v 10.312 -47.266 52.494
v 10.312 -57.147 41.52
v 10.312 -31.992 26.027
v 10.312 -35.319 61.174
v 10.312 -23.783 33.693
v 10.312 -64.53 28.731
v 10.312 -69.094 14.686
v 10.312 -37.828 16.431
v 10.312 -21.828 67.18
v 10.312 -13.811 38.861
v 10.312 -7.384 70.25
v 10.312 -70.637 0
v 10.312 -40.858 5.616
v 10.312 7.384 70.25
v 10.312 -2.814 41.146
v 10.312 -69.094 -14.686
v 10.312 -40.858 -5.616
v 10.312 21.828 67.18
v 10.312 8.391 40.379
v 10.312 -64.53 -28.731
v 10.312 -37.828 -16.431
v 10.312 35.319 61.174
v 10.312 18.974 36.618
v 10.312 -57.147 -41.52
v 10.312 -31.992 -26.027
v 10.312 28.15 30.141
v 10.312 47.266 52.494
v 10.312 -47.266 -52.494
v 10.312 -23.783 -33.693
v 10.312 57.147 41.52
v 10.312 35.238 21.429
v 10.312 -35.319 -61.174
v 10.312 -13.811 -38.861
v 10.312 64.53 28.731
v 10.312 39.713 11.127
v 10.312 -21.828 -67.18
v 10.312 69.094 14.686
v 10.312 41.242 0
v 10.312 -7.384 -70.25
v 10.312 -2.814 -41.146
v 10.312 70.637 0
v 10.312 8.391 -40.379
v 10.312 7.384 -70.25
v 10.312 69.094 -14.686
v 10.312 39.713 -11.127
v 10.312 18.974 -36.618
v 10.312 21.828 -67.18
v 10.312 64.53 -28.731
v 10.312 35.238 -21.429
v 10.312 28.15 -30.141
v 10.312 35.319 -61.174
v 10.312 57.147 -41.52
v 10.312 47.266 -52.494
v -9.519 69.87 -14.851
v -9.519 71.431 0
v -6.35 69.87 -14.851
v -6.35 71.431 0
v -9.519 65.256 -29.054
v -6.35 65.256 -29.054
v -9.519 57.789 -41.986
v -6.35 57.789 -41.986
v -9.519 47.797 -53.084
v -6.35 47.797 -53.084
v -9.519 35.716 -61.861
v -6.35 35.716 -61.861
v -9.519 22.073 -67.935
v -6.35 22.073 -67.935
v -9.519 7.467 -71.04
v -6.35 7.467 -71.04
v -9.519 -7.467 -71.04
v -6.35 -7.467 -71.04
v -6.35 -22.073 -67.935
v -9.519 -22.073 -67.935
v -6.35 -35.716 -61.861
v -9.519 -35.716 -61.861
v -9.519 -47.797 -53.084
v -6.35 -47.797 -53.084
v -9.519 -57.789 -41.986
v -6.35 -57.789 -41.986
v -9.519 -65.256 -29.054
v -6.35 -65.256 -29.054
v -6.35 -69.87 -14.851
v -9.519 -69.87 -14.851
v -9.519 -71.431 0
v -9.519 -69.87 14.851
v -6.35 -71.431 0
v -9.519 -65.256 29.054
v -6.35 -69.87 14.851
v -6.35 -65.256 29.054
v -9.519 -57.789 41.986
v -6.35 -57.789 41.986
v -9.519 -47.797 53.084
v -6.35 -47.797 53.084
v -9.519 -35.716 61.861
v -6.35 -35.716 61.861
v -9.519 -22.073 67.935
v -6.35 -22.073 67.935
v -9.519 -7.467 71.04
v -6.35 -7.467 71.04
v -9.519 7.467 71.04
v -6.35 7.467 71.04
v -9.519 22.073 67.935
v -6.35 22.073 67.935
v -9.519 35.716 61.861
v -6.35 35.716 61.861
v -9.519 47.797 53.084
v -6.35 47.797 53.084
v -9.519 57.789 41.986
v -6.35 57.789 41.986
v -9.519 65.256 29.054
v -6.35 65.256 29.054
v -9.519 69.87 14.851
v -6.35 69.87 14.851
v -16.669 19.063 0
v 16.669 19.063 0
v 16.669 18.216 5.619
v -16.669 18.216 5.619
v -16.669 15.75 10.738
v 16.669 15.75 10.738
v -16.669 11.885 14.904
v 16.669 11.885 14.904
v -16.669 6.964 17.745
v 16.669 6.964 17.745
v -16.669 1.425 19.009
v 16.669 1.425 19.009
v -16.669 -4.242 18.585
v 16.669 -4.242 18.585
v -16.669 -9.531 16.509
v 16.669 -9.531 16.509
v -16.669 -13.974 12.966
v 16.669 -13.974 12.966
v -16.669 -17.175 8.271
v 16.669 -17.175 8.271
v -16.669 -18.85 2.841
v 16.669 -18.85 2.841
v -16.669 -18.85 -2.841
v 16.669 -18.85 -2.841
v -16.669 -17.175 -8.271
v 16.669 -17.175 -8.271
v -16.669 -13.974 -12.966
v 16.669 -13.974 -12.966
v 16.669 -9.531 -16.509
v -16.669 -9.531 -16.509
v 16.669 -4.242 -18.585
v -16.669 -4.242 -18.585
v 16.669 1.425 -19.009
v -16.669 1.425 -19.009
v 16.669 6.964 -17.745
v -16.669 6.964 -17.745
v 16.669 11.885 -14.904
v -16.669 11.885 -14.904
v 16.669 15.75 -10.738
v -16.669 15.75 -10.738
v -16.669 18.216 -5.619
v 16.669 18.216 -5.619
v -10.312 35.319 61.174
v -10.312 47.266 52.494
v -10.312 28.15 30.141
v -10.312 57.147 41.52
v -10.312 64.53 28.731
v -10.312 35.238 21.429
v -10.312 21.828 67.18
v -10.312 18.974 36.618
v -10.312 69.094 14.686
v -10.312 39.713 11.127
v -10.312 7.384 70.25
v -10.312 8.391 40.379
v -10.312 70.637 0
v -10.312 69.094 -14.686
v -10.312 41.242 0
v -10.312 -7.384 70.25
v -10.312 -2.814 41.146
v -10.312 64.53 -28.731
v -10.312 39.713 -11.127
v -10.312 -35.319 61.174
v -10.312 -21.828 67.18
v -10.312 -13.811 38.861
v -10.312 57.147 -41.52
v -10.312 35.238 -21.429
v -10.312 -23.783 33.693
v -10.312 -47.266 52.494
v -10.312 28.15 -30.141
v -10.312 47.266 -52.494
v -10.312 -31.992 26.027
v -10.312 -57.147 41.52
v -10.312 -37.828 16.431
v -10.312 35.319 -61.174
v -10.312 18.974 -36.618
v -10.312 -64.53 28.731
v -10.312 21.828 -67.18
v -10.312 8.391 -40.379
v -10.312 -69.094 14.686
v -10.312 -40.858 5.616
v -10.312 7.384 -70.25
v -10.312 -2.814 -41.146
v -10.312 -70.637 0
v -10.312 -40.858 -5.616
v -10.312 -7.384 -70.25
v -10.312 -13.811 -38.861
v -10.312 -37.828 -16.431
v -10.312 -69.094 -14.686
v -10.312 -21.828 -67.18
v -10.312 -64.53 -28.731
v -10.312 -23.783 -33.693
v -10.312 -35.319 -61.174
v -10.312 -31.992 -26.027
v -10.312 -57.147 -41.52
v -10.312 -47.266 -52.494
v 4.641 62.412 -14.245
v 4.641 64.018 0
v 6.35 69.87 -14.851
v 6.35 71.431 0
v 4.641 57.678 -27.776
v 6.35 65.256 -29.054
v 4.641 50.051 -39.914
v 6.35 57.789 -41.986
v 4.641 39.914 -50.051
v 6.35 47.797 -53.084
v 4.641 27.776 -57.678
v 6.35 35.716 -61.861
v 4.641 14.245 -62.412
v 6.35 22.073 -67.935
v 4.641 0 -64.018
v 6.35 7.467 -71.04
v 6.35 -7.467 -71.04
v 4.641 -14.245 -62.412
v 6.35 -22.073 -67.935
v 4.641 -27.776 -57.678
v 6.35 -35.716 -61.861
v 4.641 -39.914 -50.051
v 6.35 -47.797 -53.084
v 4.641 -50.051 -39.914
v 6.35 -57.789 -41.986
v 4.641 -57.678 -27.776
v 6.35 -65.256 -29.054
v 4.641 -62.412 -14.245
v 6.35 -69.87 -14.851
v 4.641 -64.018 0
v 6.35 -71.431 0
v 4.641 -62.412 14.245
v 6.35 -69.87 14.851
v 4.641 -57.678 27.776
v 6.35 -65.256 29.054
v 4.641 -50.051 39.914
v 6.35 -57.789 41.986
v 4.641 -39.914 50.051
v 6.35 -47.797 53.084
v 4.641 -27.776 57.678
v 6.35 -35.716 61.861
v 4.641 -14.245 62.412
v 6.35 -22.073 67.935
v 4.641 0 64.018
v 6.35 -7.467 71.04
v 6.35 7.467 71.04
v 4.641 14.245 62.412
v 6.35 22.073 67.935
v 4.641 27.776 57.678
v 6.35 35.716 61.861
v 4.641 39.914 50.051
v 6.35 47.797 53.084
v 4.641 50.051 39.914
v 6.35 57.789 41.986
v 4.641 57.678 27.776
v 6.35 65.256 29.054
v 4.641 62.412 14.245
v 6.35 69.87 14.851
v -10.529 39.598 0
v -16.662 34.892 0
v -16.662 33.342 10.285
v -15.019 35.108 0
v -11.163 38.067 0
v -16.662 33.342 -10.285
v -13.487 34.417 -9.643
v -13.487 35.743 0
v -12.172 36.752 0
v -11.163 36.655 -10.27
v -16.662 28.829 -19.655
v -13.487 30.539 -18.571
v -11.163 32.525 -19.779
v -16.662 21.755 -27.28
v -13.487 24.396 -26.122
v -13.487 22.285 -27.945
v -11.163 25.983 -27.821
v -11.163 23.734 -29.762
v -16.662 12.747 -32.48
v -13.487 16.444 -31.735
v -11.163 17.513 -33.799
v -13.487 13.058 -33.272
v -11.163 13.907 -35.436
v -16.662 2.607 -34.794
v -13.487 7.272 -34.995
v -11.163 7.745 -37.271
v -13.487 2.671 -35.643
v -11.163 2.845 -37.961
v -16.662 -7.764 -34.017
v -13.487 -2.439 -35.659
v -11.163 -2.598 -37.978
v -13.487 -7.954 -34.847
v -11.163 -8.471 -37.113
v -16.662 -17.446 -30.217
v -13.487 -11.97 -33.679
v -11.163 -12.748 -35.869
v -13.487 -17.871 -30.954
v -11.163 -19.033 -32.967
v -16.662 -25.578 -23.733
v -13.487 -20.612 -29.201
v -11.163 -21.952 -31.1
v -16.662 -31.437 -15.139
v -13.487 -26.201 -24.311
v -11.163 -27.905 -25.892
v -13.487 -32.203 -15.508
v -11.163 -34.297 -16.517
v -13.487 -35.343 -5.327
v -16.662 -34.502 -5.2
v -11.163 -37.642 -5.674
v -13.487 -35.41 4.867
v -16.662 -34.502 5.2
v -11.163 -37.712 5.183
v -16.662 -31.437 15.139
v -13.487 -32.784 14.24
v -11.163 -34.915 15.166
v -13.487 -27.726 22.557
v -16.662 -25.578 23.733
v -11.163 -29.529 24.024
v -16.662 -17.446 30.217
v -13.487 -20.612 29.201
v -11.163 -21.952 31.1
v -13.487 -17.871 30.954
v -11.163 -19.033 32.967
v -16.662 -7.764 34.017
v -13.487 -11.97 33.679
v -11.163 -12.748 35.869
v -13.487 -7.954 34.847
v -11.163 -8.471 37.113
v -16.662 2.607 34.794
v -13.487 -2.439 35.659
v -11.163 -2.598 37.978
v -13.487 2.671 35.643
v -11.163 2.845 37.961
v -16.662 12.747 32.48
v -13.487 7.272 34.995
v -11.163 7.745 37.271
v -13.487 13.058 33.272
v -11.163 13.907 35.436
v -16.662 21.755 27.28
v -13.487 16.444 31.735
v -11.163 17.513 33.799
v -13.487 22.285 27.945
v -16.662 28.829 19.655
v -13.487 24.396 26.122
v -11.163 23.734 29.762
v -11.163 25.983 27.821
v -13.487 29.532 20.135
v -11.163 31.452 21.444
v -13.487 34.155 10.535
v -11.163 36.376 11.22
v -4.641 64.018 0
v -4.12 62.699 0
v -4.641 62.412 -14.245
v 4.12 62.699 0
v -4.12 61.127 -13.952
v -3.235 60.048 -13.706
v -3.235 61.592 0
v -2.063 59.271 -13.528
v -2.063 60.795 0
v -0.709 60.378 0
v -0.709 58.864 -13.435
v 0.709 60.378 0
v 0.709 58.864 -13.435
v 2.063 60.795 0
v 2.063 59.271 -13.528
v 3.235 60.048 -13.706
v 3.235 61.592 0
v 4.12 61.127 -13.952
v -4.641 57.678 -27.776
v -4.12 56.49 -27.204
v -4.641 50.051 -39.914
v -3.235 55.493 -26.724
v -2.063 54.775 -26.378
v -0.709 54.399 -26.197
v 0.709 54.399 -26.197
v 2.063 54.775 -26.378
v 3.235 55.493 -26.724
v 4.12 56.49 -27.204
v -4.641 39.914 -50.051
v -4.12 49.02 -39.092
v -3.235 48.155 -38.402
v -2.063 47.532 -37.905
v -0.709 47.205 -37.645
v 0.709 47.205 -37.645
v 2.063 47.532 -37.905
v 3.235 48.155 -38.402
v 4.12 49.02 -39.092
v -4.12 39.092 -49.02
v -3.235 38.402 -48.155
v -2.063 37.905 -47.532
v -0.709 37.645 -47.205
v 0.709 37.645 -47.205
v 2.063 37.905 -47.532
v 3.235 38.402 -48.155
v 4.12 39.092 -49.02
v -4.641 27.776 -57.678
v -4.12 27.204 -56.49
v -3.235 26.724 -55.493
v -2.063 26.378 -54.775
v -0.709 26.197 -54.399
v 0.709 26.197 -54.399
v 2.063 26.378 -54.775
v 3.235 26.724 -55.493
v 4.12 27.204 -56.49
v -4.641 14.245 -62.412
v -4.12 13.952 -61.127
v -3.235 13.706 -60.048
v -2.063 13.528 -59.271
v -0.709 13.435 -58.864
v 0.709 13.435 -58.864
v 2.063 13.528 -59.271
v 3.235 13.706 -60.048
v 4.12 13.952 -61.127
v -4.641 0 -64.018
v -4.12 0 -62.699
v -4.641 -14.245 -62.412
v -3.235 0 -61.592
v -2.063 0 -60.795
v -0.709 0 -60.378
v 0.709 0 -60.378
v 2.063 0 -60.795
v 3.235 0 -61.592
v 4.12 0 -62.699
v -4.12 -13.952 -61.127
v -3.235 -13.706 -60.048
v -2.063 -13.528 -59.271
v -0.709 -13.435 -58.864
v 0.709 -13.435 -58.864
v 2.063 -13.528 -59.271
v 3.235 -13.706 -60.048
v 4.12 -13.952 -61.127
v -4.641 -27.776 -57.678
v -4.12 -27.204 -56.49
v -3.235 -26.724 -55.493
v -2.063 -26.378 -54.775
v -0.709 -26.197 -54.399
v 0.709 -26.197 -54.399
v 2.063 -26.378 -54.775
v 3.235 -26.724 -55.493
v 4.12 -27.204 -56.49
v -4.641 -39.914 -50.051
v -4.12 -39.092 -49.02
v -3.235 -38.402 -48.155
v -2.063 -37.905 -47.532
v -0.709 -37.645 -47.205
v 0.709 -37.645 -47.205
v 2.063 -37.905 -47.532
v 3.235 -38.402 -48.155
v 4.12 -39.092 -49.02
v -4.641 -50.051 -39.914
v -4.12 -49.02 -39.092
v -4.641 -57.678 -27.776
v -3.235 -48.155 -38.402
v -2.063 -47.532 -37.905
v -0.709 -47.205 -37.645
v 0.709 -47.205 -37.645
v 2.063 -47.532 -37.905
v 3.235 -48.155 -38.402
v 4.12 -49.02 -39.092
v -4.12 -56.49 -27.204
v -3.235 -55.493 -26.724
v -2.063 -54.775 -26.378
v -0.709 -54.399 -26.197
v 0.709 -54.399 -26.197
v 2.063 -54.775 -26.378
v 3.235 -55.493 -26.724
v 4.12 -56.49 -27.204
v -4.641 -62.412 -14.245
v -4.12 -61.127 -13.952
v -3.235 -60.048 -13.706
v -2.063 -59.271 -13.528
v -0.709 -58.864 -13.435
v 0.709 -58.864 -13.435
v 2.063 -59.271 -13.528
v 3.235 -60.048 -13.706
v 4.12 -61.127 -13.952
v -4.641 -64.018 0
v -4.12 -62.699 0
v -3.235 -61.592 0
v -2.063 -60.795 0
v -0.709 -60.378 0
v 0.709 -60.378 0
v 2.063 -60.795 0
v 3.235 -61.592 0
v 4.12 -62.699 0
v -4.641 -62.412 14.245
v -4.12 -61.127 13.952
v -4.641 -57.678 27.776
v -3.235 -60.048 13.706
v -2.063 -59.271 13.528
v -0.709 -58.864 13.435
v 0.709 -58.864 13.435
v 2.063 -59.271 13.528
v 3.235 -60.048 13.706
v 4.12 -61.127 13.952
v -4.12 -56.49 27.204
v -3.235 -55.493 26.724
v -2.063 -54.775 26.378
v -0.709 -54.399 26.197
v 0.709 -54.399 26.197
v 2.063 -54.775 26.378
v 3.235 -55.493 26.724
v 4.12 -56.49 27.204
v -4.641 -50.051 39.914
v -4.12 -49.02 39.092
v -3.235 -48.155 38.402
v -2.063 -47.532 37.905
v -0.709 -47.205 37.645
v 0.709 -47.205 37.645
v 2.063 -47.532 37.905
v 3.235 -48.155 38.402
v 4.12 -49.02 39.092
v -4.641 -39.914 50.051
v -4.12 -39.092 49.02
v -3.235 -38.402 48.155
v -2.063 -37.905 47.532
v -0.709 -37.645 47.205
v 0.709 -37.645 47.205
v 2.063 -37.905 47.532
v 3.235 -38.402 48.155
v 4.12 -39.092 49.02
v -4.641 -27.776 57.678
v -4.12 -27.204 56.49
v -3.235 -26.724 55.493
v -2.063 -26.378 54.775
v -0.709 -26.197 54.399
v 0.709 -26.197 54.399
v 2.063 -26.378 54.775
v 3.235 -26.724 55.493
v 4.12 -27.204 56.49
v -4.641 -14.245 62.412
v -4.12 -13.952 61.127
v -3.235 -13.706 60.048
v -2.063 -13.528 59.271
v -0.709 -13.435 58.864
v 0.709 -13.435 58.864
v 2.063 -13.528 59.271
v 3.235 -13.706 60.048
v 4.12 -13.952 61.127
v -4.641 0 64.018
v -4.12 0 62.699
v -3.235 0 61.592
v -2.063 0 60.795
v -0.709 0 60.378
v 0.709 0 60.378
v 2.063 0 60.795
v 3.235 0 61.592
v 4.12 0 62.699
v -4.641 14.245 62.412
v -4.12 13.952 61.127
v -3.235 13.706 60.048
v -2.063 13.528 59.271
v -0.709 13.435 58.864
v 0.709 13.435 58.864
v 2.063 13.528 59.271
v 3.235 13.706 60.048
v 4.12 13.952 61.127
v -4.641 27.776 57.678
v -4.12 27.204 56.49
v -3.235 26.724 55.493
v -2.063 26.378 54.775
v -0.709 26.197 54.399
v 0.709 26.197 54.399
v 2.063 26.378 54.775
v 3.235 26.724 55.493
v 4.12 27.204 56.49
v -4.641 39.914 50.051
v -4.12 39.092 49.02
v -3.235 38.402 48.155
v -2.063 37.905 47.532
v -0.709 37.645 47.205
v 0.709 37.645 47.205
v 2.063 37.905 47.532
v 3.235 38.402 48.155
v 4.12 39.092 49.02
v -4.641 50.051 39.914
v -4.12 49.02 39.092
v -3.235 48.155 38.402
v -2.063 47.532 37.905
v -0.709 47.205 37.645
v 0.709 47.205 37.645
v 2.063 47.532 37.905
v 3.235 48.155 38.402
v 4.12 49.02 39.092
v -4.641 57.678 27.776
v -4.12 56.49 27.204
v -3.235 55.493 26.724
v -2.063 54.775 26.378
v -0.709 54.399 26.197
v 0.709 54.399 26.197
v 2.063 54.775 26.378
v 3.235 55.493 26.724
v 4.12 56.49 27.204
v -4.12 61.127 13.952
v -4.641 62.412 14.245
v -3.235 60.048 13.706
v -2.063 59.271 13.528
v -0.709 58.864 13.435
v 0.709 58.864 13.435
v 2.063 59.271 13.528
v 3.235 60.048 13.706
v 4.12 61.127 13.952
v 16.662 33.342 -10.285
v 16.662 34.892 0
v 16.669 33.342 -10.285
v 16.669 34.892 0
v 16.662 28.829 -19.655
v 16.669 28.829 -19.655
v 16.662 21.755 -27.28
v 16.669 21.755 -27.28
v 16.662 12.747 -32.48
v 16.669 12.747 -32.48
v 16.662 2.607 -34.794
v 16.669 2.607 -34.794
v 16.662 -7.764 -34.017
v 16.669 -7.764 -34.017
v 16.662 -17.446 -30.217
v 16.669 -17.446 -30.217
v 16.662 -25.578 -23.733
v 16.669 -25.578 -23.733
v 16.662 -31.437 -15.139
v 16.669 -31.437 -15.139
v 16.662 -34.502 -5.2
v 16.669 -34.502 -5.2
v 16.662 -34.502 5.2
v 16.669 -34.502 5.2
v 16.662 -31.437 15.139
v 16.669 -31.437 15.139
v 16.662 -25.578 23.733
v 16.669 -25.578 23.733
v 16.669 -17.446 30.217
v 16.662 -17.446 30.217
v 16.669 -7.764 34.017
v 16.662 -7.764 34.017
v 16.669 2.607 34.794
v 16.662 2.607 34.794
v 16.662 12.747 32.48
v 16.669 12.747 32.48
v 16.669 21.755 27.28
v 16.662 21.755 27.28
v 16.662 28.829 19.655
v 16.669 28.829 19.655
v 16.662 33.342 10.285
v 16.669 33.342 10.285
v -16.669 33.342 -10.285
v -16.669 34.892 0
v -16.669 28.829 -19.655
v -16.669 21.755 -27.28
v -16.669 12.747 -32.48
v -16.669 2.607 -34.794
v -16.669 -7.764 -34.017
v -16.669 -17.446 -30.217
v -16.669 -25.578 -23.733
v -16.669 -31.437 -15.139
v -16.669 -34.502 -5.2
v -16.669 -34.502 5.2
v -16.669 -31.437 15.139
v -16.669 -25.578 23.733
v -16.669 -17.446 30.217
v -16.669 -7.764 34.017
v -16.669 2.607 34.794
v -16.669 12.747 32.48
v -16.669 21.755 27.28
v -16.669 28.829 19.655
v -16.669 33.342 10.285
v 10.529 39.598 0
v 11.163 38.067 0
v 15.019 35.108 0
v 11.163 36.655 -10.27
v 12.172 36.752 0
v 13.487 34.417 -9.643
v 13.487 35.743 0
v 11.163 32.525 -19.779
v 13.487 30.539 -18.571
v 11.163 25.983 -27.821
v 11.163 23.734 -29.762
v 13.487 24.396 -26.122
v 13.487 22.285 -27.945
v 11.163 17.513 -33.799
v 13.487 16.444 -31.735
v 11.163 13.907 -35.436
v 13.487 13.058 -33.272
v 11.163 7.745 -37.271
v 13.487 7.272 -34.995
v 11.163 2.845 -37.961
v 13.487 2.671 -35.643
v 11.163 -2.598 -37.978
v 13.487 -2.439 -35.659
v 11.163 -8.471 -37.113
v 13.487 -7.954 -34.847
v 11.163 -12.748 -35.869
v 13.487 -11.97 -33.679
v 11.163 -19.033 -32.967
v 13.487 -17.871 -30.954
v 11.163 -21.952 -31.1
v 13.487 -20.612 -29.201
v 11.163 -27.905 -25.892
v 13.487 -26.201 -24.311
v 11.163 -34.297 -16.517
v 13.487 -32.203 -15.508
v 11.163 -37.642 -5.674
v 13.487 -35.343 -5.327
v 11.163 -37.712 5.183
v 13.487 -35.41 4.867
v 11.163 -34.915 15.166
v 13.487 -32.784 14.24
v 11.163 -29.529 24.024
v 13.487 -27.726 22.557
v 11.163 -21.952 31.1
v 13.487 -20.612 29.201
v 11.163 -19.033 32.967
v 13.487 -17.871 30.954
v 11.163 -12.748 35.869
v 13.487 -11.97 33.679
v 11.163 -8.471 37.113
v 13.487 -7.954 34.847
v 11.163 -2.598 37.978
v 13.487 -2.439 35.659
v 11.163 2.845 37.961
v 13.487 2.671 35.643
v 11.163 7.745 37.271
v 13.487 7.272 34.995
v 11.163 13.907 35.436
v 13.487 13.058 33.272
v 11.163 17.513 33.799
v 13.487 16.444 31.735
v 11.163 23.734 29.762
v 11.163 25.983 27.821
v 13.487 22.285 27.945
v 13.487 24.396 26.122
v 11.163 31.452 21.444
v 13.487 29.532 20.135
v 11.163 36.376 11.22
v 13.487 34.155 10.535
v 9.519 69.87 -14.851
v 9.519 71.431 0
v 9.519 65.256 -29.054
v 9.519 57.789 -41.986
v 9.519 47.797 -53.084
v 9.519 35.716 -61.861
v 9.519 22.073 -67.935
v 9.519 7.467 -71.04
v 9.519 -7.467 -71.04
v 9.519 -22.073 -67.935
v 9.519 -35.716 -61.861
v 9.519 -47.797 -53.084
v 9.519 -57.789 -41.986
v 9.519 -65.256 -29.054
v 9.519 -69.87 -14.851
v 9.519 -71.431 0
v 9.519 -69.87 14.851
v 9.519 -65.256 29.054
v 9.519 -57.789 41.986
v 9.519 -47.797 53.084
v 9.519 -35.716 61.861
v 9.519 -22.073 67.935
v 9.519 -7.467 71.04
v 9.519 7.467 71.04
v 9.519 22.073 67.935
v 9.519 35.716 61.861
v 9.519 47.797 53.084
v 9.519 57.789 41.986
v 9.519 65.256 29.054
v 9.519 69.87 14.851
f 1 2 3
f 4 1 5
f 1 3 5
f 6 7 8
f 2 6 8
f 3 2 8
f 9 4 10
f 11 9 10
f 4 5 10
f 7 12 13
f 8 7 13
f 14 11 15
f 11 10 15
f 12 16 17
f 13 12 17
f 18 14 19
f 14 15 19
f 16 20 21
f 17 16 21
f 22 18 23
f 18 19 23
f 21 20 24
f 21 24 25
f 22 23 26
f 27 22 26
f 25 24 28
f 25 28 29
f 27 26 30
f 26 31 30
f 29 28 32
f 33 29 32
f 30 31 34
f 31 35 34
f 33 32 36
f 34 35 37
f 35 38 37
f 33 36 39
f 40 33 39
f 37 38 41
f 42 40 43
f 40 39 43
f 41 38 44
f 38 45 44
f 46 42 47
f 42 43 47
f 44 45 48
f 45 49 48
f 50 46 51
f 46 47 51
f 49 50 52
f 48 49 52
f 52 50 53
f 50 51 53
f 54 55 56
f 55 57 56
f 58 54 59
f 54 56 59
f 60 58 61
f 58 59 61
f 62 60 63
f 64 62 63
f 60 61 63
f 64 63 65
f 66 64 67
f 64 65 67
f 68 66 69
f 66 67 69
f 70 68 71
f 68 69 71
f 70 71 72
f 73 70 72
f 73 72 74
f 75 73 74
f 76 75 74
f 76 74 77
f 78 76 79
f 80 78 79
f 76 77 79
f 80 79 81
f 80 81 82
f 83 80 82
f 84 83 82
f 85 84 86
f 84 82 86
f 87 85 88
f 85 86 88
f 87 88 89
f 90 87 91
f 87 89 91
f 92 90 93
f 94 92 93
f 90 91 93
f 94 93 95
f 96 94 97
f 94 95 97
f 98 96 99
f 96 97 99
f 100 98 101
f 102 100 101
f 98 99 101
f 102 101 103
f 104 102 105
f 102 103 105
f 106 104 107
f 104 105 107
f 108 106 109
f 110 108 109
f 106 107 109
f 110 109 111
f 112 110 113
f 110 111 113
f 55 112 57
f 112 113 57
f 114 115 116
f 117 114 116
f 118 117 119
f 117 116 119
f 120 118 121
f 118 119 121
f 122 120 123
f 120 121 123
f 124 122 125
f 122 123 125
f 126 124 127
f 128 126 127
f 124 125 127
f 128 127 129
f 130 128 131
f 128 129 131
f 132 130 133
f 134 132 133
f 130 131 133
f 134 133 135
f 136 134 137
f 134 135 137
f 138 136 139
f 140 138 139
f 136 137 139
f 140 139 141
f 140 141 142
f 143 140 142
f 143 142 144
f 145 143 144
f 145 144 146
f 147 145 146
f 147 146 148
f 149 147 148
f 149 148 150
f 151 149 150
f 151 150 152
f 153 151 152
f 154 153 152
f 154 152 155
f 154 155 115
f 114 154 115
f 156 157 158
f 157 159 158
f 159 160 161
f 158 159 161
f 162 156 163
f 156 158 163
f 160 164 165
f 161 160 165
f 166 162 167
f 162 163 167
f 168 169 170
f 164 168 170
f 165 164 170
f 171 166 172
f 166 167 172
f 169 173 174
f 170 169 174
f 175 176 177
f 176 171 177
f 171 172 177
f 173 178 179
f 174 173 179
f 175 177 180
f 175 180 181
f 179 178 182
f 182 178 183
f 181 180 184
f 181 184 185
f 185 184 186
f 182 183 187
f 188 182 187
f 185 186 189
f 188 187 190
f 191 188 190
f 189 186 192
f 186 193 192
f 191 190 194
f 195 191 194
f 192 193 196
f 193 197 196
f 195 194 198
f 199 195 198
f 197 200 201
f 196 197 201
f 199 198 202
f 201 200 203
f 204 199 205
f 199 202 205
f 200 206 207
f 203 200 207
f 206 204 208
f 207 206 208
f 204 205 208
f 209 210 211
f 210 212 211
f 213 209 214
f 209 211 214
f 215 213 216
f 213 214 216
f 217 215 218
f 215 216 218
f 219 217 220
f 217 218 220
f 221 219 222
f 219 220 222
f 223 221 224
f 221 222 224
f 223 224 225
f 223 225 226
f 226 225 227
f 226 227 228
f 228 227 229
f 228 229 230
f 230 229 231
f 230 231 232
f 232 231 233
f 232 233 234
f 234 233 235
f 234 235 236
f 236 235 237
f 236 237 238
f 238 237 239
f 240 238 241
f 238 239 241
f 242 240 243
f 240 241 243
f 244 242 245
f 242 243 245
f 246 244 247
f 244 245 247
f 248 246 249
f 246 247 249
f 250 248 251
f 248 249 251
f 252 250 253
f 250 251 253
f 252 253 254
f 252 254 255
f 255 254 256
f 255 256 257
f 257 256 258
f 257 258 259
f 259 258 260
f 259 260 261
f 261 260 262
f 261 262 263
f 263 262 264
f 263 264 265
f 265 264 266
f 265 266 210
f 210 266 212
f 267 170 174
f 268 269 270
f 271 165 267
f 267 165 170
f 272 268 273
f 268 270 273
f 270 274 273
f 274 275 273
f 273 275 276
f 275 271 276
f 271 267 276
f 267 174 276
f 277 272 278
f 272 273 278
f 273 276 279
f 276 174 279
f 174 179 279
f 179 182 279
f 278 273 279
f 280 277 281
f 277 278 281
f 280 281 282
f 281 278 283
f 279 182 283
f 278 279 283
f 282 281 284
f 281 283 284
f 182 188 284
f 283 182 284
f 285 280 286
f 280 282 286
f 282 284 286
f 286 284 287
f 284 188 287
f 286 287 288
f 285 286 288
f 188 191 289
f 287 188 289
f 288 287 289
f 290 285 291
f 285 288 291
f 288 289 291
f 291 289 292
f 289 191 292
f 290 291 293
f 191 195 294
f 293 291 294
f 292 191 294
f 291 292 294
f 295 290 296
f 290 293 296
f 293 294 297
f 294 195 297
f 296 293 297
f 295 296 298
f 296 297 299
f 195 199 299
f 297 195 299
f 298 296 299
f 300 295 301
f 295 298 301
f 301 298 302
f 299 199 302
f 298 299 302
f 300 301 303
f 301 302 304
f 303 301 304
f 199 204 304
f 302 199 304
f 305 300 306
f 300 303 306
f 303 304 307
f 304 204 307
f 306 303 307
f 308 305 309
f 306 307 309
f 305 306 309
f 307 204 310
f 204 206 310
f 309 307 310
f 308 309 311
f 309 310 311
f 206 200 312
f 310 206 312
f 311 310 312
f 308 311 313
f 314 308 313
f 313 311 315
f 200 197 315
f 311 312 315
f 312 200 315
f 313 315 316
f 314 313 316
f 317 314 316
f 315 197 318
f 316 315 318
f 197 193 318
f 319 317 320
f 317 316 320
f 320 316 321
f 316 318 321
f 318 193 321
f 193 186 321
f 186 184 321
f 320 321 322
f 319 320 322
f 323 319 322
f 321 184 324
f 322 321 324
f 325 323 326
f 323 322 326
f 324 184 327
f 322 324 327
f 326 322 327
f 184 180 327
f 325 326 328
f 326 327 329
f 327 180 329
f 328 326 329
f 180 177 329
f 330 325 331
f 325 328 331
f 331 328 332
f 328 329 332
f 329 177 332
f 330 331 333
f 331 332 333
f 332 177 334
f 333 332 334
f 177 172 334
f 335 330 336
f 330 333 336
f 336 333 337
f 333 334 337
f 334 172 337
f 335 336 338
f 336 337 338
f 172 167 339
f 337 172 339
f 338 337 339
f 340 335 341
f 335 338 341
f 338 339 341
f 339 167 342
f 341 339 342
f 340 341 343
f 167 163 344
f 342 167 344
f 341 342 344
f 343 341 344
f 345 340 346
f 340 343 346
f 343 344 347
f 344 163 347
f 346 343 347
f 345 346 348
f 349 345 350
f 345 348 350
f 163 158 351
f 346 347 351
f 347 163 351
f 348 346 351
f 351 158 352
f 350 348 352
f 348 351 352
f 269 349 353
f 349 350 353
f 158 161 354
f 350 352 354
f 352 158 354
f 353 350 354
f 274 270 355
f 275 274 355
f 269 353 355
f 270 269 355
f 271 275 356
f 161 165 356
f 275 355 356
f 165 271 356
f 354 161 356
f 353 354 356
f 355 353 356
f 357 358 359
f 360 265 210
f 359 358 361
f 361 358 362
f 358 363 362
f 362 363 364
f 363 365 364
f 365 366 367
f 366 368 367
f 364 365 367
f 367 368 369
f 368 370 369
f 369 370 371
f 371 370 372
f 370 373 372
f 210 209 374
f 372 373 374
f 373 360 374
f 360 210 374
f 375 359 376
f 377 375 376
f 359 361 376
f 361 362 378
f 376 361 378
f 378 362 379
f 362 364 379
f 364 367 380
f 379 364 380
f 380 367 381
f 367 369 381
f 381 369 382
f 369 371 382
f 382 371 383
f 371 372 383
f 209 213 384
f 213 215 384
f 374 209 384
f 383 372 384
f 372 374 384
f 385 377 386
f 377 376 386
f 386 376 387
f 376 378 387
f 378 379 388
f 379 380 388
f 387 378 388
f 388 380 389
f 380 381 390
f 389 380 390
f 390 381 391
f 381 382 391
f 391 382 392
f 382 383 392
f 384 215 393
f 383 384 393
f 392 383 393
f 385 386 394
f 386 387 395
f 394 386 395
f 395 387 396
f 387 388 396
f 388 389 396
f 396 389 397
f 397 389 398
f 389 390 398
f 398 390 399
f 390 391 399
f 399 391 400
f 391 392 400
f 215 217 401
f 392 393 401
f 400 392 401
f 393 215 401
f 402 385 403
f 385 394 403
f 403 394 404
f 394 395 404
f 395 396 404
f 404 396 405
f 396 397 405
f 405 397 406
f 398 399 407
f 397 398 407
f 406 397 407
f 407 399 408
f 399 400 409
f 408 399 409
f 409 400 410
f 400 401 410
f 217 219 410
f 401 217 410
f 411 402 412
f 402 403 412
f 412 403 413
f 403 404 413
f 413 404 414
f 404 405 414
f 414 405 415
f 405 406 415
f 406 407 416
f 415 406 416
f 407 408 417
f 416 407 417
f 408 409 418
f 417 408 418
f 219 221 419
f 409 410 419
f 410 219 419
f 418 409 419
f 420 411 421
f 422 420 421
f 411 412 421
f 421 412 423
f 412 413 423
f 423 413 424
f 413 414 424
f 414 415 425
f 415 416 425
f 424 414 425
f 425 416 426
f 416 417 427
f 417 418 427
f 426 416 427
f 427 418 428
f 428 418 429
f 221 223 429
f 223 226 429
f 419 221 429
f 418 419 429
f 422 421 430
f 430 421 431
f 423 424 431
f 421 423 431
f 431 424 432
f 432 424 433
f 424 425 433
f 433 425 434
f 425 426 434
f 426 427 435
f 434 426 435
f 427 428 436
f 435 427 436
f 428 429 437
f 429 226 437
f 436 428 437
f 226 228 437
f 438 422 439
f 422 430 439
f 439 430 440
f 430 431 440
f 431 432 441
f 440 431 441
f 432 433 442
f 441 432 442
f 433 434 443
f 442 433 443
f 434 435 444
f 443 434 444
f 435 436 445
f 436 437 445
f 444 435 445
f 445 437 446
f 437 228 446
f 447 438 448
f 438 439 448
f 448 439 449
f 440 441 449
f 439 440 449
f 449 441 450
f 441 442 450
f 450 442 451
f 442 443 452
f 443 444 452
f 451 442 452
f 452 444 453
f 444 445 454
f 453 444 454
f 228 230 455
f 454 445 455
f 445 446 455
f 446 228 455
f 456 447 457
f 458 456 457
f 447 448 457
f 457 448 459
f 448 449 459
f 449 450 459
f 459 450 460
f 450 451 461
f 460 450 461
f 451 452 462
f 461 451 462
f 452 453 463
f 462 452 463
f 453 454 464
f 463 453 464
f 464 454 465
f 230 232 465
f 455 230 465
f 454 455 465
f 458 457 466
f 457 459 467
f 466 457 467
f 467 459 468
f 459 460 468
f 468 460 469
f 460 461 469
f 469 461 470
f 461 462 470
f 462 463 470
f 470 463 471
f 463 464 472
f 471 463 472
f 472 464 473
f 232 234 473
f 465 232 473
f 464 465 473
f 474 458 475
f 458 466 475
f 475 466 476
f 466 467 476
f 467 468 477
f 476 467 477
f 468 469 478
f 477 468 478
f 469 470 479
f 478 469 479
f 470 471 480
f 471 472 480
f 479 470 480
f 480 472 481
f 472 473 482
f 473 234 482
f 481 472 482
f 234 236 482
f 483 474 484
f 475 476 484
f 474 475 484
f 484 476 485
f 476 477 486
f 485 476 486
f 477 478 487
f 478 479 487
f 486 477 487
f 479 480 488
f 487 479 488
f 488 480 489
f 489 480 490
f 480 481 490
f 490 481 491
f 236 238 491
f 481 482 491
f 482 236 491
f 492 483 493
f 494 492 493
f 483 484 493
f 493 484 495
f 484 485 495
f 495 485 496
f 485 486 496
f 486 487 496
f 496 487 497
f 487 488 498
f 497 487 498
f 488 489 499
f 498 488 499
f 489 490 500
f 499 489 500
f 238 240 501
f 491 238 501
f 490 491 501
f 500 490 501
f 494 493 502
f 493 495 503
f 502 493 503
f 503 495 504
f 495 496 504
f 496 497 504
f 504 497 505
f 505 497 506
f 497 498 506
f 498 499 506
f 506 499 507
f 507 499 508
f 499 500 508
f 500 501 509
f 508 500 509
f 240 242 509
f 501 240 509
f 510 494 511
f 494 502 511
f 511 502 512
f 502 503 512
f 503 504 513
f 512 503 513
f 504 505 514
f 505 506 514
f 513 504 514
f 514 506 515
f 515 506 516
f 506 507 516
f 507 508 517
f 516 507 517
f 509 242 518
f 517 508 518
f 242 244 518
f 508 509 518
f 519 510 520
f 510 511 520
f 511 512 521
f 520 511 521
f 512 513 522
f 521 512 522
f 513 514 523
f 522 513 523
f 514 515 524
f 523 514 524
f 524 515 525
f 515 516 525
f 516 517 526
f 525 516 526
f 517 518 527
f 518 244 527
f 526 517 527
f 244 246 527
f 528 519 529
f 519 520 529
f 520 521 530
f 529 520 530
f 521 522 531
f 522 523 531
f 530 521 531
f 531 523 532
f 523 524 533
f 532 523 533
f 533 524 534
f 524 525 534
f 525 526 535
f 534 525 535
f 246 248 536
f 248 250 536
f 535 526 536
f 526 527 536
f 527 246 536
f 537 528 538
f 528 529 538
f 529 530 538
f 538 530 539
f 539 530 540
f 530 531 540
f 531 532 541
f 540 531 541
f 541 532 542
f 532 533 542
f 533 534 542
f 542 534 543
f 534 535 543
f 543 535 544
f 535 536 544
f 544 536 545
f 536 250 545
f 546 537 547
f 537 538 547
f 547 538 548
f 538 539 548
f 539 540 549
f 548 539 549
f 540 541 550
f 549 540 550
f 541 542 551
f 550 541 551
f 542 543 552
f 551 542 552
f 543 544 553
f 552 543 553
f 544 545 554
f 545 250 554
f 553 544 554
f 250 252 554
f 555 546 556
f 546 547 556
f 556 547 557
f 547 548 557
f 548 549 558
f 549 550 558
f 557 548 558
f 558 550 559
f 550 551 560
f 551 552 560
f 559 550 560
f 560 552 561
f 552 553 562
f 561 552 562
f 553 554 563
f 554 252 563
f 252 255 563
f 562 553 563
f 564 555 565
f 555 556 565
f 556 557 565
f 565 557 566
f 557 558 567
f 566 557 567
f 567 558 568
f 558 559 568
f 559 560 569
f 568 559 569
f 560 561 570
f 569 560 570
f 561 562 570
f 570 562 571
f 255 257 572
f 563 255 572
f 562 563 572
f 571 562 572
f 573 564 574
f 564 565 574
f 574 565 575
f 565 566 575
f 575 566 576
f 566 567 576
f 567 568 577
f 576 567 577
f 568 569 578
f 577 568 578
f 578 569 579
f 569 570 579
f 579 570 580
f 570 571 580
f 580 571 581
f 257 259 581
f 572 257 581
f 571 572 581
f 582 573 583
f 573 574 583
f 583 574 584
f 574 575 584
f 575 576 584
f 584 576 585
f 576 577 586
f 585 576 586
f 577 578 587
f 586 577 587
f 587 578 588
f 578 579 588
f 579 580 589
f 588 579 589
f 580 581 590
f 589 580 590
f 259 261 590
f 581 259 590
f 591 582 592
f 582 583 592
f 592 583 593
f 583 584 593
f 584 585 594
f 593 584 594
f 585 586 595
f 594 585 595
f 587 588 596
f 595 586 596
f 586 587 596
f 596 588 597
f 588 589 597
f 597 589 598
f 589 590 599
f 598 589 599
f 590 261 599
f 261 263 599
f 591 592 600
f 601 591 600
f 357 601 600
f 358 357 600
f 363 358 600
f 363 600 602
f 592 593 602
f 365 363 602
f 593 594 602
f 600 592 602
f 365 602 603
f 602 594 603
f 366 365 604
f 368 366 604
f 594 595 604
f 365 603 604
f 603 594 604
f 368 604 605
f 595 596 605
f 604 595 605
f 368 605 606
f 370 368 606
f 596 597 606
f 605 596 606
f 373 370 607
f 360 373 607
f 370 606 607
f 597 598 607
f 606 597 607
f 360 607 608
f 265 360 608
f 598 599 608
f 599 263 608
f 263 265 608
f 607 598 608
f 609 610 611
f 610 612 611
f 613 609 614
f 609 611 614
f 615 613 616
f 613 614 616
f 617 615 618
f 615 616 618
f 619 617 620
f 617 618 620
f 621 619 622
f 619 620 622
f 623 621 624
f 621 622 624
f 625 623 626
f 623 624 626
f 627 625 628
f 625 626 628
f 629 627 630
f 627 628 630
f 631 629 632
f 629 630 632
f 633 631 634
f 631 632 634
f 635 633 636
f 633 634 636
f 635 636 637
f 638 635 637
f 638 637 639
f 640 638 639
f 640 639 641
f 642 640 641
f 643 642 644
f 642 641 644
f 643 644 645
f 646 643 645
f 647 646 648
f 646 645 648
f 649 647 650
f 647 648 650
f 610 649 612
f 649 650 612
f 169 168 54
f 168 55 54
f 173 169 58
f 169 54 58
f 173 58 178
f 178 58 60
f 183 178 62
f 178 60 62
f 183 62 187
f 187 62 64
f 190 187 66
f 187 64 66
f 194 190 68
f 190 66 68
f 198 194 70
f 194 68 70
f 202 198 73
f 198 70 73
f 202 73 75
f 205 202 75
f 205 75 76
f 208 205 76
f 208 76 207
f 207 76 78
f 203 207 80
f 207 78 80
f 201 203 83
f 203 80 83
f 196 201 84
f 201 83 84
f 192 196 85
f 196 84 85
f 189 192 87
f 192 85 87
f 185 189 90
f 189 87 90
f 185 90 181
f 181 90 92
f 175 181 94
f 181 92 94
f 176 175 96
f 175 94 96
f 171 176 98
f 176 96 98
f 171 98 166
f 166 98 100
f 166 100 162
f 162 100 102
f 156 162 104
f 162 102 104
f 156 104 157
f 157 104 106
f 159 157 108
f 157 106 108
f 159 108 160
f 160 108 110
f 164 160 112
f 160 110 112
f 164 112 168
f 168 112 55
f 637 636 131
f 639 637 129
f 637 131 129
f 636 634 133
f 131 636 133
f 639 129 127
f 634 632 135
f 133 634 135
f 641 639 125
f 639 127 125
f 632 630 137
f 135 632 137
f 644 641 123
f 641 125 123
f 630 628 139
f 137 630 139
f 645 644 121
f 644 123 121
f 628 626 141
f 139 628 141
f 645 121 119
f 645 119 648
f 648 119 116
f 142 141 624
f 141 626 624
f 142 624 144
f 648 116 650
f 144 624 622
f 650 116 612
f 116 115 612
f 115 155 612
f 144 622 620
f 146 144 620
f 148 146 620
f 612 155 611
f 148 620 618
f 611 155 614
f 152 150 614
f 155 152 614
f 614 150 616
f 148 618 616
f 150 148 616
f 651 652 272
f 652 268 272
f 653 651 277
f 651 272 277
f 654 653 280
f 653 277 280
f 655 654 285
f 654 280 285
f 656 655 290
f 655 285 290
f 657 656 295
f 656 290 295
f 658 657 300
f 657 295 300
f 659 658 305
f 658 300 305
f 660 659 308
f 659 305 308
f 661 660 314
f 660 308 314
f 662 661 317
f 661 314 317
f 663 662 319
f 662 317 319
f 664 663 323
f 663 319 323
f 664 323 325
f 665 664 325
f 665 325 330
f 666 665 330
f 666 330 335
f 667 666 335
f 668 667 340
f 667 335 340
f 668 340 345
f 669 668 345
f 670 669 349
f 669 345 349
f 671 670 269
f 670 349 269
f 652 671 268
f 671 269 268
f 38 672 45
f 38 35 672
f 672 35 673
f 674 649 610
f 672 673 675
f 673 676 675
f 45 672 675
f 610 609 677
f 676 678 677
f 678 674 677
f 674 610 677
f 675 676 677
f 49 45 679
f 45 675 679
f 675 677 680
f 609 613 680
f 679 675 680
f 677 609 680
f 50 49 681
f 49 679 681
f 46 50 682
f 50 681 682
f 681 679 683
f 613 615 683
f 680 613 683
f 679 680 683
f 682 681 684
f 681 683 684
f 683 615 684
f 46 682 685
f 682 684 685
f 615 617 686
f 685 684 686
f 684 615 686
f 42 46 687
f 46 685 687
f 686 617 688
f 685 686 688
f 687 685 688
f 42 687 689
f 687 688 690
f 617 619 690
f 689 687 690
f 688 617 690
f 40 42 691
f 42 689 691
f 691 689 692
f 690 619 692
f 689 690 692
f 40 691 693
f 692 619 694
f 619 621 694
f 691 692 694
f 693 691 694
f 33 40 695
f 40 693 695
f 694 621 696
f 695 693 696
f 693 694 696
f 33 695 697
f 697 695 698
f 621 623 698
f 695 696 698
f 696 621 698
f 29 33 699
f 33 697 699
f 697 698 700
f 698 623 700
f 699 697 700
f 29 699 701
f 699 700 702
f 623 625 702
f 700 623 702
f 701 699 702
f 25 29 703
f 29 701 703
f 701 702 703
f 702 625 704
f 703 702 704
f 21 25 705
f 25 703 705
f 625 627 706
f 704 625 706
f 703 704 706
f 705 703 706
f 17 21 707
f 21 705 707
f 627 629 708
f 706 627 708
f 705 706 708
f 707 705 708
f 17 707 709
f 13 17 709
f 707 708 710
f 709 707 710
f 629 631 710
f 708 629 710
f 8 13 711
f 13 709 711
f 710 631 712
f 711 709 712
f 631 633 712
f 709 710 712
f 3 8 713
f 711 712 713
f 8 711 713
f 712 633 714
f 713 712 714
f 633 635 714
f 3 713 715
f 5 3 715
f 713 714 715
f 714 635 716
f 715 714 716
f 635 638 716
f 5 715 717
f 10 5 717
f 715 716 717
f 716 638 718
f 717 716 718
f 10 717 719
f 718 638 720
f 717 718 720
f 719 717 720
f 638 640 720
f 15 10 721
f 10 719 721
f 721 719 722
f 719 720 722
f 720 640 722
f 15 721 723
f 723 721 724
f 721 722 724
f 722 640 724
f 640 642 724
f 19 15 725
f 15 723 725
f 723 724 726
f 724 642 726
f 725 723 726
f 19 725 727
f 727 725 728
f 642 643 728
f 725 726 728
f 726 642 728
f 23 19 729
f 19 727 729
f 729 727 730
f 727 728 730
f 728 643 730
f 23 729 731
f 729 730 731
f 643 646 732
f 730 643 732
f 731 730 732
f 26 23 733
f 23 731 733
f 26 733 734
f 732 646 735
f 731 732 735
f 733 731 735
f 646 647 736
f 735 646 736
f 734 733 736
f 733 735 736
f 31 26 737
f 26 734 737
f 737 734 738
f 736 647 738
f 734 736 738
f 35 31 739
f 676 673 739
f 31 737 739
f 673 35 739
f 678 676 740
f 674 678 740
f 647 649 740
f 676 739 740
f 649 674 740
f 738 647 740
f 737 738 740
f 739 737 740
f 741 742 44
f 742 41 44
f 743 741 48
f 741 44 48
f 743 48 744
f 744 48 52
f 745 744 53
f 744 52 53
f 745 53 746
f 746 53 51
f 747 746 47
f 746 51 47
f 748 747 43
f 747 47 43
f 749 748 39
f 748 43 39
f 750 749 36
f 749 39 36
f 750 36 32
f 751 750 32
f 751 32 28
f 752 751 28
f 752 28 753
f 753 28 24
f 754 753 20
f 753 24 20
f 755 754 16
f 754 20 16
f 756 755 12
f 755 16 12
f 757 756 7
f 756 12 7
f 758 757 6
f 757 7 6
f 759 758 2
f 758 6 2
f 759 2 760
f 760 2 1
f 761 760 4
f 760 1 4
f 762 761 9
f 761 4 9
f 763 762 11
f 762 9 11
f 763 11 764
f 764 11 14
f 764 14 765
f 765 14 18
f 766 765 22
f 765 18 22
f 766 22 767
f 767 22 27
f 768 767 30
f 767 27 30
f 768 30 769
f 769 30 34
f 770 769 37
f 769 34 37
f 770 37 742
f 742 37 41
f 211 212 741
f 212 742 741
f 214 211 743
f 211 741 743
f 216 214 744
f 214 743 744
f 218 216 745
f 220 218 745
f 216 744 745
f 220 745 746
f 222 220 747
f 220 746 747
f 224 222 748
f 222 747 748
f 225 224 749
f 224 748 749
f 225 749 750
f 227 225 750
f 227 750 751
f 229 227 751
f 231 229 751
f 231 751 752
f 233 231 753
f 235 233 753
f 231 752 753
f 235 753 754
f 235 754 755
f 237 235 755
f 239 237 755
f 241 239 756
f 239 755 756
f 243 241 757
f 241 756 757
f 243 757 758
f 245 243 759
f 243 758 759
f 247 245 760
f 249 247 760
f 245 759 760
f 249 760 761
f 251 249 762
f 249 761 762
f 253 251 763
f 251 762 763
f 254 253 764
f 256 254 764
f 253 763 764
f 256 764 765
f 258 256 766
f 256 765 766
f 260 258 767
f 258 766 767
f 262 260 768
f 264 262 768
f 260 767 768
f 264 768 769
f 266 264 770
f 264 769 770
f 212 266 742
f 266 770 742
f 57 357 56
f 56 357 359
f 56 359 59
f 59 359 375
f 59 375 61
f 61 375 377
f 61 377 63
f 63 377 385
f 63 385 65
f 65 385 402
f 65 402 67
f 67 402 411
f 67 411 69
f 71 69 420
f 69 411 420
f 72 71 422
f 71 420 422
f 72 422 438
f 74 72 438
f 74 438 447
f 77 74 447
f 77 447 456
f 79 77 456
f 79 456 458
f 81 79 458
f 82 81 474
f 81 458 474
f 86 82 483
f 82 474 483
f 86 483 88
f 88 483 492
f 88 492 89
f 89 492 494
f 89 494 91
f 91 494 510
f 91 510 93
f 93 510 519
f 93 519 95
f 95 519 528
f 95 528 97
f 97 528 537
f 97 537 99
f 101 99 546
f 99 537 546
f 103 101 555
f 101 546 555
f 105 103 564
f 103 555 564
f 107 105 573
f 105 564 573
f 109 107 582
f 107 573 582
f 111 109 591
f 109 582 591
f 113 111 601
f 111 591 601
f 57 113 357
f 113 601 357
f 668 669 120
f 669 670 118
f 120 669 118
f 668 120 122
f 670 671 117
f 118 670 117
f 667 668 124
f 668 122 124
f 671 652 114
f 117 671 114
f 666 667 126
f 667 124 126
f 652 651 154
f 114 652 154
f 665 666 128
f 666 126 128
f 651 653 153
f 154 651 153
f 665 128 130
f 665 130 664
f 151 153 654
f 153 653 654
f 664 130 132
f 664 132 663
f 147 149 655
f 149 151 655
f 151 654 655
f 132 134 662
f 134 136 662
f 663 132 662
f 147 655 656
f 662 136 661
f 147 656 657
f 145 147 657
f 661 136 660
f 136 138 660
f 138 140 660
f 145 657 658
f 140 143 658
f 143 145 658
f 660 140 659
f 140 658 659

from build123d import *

# Parameters (mm, degrees)
SKETCH2_R          = 19.0627
CUT_EXTRUDE1_DEPTH = 34.3375


with BuildPart() as part:
    # Sketch1 → Revolve1 (revolve)
    with BuildSketch(Plane.XY):
        with BuildLine():
            Line((16.66875, 0), (-16.66875, 0))
            Line((-16.66875, 0), (-16.66875, 34.891972302))
            Line((-16.66875, 34.891972302), (-16.6624, 34.891972302))
            ThreePointArc((-16.6624, 34.891972302), (-12.172271939, 36.751844242), (-10.3124, 41.241972302))
            Line((-10.3124, 41.241972302), (-10.3124, 70.6374))
            Line((-10.3124, 70.6374), (-9.51865, 71.43115))
            Line((-9.51865, 71.43115), (-6.35, 71.43115))
            Line((-6.35, 71.43115), (-4.640755559, 64.017549491))
            ThreePointArc((-4.640755559, 64.017549491), (0, 60.325), (4.640755559, 64.017549491))
            Line((4.640755559, 64.017549491), (6.35, 71.43115))
            Line((6.35, 71.43115), (9.51865, 71.43115))
            Line((9.51865, 71.43115), (10.3124, 70.6374))
            Line((10.3124, 70.6374), (10.3124, 41.241972302))
            ThreePointArc((10.3124, 41.241972302), (12.172271939, 36.751844242), (16.6624, 34.891972302))
            Line((16.6624, 34.891972302), (16.66875, 34.891972302))
            Line((16.66875, 34.891972302), (16.66875, 0))
        make_face()
    revolve(axis=Axis((16.66875, 0, 0), (-1, 0, 0)))

    # Sketch2 → Cut-Extrude1 (cut, through all)
    with BuildSketch(Plane(origin=(16.66875, 0, 0), x_dir=(0, 0, -1), z_dir=(1, 0, 0))):
        with Locations(Location((0, 0, 0), (0, 0, 90))):  # turned: the seam where the file's is
            Circle(SKETCH2_R)
    extrude(amount=-CUT_EXTRUDE1_DEPTH, mode=Mode.SUBTRACT)


solid = part.part
